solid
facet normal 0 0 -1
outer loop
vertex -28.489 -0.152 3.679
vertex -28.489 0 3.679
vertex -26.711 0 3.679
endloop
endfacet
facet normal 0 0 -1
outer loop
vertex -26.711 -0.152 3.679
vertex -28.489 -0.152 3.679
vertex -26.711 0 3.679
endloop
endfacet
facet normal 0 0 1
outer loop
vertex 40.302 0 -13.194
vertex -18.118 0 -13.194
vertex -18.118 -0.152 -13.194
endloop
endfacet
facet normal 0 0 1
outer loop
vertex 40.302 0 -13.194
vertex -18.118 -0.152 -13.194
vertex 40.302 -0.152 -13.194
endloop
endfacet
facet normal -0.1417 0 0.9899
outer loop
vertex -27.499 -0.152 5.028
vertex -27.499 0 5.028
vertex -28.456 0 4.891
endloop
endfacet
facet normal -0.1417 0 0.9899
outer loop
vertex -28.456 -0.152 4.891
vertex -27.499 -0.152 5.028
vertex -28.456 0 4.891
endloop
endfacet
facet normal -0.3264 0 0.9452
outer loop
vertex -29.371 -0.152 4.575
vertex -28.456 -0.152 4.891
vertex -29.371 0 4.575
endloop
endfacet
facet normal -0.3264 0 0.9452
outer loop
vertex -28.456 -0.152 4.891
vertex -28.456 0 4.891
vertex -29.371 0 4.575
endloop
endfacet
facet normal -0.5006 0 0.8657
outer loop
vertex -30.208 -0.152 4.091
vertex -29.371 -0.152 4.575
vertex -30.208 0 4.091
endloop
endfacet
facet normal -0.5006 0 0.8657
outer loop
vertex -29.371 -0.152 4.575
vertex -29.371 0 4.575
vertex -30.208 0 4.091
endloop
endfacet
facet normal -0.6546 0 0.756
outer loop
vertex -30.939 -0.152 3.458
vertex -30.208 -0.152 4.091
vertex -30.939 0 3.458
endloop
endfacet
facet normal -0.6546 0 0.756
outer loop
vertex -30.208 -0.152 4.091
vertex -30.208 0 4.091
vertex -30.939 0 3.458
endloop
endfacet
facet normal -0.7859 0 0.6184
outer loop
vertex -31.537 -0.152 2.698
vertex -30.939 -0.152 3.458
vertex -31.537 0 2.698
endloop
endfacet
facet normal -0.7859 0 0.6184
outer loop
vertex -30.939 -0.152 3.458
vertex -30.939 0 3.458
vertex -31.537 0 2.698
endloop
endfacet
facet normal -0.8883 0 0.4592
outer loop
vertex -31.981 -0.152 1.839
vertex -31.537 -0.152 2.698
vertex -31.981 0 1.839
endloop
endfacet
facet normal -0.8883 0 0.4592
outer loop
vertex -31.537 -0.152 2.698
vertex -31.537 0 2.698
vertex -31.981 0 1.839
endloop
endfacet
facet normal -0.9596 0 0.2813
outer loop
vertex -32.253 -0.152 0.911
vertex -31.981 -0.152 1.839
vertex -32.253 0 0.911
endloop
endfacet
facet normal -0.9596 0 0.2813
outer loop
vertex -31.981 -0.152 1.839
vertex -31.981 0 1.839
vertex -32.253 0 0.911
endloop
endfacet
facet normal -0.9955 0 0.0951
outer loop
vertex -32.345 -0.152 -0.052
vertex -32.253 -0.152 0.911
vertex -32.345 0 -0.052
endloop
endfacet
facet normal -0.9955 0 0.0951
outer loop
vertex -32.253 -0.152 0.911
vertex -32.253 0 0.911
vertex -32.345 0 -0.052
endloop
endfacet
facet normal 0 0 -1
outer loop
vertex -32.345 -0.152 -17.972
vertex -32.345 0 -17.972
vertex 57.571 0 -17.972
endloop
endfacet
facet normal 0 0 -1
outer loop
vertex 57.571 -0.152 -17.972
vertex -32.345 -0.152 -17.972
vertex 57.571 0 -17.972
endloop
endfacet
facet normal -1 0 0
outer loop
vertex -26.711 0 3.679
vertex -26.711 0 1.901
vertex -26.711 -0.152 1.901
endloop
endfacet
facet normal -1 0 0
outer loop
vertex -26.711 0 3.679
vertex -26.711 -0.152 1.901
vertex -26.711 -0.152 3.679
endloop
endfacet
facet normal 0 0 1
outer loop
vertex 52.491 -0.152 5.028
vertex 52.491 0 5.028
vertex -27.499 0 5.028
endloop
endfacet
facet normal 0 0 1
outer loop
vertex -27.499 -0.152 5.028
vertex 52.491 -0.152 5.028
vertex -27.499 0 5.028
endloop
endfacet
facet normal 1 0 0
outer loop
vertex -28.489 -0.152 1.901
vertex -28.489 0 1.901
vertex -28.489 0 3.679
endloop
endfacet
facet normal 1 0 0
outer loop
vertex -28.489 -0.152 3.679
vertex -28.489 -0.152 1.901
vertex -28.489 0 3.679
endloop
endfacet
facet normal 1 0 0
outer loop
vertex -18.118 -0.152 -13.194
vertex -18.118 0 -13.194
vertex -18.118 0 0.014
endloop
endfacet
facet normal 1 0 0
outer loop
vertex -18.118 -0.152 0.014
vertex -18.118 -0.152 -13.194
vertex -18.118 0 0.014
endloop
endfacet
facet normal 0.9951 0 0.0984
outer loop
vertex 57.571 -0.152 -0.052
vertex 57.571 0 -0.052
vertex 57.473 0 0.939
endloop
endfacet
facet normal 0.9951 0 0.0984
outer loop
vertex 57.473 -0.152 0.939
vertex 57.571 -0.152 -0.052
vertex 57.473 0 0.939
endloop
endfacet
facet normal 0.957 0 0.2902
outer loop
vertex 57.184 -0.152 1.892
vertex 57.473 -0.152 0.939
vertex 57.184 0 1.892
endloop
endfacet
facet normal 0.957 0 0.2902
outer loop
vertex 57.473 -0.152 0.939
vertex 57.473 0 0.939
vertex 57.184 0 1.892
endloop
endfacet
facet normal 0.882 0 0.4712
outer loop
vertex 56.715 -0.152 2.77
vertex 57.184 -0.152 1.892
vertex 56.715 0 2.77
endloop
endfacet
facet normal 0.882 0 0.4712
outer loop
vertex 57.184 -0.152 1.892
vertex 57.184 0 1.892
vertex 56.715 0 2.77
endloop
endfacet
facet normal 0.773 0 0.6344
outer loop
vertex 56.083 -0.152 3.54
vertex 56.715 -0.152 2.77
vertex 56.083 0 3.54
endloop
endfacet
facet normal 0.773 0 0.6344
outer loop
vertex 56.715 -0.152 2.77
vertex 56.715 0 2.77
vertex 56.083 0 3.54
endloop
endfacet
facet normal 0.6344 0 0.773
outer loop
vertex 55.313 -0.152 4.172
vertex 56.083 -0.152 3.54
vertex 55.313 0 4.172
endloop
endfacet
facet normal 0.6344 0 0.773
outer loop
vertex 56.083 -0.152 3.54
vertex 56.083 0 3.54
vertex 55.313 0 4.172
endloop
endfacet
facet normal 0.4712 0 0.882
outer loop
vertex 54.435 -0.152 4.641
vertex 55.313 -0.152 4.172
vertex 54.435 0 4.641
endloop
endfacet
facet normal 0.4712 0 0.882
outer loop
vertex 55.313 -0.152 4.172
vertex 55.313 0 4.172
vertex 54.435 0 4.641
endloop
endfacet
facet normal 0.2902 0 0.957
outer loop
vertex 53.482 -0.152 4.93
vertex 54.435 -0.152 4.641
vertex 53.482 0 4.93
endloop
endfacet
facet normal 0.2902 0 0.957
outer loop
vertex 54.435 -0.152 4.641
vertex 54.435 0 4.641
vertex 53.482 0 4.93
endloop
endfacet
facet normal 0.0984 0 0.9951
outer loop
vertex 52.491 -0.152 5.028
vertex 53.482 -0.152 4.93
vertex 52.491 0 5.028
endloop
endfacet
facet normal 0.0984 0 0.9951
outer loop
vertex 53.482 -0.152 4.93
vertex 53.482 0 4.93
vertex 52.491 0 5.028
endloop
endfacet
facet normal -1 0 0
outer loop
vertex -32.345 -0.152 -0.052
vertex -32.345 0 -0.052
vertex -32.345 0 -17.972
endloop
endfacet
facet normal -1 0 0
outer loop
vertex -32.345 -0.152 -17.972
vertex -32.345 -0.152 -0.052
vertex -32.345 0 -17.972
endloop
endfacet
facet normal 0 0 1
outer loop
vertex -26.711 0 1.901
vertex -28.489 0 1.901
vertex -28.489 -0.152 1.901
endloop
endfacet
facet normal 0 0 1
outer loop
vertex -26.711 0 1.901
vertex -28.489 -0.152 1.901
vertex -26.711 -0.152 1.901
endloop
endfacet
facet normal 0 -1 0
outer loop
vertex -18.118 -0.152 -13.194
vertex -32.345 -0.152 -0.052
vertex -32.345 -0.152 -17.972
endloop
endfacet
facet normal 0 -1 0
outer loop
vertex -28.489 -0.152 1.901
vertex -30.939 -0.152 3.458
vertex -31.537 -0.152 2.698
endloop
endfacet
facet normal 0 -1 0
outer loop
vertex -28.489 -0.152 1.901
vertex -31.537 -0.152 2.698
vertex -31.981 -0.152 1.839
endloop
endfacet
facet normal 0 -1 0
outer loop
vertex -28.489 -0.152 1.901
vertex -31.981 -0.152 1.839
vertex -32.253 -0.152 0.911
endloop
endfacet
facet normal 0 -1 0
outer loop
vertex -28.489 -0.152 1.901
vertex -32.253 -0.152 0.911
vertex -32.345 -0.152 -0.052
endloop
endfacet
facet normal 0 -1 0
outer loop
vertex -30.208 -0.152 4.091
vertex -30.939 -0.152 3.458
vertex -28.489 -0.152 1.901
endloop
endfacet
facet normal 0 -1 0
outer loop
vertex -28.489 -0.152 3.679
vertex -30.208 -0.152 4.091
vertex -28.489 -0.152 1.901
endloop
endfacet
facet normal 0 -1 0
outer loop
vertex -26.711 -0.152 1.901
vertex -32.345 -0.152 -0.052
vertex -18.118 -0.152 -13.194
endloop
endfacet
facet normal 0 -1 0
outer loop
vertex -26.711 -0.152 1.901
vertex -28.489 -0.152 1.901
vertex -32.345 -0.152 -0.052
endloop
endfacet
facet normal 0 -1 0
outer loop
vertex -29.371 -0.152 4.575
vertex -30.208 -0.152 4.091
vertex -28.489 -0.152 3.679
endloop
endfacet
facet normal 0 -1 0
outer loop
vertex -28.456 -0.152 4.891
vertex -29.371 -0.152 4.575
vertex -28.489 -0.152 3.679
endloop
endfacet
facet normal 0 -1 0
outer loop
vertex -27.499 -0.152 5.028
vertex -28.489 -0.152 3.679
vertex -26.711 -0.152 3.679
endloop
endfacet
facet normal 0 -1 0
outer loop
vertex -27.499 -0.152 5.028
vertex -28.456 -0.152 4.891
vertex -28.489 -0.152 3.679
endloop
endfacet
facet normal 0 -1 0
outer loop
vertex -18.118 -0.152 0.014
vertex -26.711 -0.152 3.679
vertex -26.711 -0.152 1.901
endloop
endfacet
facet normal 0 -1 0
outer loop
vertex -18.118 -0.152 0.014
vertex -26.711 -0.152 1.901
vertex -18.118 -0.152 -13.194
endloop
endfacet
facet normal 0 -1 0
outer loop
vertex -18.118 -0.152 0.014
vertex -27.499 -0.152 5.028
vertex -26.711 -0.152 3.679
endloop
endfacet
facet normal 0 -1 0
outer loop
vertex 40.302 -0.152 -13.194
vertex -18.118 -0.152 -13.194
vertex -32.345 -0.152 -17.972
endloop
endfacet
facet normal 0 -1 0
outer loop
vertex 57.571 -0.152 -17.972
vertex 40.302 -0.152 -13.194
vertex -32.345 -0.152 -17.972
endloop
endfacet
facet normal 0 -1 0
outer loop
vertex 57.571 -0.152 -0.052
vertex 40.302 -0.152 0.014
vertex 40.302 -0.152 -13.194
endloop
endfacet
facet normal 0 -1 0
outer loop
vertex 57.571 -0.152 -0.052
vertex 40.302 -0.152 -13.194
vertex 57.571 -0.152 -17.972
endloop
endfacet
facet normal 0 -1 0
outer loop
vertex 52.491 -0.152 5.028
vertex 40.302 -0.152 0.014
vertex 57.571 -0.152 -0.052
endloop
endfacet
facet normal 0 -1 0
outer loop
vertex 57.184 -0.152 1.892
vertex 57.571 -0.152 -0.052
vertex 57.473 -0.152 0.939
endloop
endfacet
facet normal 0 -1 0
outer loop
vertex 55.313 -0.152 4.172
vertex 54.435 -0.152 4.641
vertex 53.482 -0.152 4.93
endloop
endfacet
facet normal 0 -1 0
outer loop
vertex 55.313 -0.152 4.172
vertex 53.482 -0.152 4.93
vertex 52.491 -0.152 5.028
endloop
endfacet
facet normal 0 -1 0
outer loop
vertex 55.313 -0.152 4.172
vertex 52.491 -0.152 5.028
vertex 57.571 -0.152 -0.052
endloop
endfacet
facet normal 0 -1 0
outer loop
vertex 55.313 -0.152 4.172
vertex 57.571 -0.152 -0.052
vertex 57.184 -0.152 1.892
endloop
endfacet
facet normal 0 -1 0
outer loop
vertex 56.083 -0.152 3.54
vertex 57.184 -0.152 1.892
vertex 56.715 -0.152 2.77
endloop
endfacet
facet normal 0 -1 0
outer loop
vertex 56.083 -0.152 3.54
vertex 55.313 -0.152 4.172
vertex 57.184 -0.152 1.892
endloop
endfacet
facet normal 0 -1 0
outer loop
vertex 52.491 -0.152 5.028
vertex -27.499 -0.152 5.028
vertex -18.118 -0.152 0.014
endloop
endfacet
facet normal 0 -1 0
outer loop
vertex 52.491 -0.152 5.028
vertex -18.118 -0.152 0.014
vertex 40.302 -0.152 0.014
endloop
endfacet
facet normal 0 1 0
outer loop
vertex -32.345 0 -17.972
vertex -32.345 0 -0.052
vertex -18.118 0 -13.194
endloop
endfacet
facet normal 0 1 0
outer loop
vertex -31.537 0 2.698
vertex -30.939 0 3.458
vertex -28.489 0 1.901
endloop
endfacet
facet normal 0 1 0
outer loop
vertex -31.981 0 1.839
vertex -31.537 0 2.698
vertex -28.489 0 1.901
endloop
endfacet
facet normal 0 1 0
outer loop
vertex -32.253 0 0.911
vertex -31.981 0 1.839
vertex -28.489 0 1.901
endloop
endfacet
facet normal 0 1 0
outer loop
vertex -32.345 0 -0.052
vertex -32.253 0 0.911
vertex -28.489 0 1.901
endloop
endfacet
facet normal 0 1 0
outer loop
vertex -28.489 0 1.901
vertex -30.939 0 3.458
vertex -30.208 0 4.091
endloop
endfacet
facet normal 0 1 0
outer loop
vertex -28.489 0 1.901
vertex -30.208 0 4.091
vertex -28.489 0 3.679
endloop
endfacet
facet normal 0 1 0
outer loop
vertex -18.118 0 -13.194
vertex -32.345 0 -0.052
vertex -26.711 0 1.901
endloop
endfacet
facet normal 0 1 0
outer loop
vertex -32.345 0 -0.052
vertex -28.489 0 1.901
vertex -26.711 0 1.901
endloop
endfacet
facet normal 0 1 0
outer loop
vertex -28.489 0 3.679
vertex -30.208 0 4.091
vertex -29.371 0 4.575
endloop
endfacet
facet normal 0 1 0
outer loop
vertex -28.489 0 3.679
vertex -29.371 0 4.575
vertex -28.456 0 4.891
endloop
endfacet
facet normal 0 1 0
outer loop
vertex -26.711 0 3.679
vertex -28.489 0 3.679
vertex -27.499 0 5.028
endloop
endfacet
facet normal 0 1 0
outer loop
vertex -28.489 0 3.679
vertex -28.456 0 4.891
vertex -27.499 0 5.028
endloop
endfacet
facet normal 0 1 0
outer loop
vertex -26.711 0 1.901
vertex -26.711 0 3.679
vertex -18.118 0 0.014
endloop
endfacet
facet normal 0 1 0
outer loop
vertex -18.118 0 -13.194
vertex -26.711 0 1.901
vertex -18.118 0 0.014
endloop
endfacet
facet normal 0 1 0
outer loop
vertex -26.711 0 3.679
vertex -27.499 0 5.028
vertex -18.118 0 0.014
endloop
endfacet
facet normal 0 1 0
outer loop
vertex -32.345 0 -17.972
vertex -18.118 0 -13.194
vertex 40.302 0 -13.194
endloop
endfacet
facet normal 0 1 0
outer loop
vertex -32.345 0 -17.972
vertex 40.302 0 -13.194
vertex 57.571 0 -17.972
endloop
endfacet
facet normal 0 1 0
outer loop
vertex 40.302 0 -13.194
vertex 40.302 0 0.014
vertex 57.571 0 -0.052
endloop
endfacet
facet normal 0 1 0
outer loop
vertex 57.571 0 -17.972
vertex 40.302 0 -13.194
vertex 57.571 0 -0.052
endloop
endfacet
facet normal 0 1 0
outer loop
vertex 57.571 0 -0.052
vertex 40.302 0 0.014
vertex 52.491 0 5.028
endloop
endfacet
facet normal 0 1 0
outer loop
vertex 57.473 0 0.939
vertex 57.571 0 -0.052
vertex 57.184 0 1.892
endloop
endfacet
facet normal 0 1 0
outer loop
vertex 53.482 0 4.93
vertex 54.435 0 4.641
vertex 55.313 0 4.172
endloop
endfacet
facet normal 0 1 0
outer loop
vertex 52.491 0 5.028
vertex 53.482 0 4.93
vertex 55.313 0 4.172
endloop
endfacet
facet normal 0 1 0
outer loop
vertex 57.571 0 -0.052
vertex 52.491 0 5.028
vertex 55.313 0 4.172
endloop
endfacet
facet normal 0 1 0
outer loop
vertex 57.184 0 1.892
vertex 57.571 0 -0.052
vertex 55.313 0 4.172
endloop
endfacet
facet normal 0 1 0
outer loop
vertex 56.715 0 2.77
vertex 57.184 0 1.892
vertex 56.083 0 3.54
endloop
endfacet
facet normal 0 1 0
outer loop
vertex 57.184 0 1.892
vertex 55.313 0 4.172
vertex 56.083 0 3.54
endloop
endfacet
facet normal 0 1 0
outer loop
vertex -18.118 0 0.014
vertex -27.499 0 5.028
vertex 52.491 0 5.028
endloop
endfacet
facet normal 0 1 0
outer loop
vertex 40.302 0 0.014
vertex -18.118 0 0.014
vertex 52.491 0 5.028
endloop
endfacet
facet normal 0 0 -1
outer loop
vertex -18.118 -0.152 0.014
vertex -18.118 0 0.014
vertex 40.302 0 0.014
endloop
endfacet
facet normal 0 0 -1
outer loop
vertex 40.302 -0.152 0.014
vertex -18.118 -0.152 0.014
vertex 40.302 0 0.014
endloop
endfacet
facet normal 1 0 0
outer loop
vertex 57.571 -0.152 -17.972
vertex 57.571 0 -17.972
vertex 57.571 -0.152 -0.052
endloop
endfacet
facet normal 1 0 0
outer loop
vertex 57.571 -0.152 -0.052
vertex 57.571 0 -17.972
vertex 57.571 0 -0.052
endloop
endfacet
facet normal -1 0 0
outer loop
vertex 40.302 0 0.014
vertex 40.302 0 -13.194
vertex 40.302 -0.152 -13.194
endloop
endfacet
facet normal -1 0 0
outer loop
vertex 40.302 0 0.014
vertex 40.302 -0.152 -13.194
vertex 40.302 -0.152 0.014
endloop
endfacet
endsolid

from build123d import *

# Parameters (mm, degrees)
F0_W     = 58.42
F0_H     = 13.208
F0_W_2   = 1.778
F0_H_2   = 1.778
F1_DEPTH = 0.1524


with BuildPart() as f1:
    # F0 (on Front) → F1 (new body)
    with BuildSketch(Plane.XZ):
        with BuildLine():
            Line((52.490655, 5.027748), (-27.499016, 5.027748))
            ThreePointArc((-27.499016, 5.027748), (-30.939431, 3.458209), (-32.345345, -0.052249))
            Line((-32.345345, -0.052249), (-32.345345, -17.972252))
            Line((-32.345345, -17.972252), (57.570655, -17.972252))
            Line((57.570655, -17.972252), (57.570655, -0.052252))
            ThreePointArc((57.570655, -0.052252), (56.082758, 3.53985), (52.490655, 5.027748))
        make_face()
        with Locations((11.092218, -6.589826)):
            Rectangle(F0_W, F0_H, mode=Mode.SUBTRACT)
        with Locations((-27.600348, 2.790164)):
            Rectangle(F0_W_2, F0_H_2, mode=Mode.SUBTRACT)
    extrude(amount=F1_DEPTH)


solid = f1.part
